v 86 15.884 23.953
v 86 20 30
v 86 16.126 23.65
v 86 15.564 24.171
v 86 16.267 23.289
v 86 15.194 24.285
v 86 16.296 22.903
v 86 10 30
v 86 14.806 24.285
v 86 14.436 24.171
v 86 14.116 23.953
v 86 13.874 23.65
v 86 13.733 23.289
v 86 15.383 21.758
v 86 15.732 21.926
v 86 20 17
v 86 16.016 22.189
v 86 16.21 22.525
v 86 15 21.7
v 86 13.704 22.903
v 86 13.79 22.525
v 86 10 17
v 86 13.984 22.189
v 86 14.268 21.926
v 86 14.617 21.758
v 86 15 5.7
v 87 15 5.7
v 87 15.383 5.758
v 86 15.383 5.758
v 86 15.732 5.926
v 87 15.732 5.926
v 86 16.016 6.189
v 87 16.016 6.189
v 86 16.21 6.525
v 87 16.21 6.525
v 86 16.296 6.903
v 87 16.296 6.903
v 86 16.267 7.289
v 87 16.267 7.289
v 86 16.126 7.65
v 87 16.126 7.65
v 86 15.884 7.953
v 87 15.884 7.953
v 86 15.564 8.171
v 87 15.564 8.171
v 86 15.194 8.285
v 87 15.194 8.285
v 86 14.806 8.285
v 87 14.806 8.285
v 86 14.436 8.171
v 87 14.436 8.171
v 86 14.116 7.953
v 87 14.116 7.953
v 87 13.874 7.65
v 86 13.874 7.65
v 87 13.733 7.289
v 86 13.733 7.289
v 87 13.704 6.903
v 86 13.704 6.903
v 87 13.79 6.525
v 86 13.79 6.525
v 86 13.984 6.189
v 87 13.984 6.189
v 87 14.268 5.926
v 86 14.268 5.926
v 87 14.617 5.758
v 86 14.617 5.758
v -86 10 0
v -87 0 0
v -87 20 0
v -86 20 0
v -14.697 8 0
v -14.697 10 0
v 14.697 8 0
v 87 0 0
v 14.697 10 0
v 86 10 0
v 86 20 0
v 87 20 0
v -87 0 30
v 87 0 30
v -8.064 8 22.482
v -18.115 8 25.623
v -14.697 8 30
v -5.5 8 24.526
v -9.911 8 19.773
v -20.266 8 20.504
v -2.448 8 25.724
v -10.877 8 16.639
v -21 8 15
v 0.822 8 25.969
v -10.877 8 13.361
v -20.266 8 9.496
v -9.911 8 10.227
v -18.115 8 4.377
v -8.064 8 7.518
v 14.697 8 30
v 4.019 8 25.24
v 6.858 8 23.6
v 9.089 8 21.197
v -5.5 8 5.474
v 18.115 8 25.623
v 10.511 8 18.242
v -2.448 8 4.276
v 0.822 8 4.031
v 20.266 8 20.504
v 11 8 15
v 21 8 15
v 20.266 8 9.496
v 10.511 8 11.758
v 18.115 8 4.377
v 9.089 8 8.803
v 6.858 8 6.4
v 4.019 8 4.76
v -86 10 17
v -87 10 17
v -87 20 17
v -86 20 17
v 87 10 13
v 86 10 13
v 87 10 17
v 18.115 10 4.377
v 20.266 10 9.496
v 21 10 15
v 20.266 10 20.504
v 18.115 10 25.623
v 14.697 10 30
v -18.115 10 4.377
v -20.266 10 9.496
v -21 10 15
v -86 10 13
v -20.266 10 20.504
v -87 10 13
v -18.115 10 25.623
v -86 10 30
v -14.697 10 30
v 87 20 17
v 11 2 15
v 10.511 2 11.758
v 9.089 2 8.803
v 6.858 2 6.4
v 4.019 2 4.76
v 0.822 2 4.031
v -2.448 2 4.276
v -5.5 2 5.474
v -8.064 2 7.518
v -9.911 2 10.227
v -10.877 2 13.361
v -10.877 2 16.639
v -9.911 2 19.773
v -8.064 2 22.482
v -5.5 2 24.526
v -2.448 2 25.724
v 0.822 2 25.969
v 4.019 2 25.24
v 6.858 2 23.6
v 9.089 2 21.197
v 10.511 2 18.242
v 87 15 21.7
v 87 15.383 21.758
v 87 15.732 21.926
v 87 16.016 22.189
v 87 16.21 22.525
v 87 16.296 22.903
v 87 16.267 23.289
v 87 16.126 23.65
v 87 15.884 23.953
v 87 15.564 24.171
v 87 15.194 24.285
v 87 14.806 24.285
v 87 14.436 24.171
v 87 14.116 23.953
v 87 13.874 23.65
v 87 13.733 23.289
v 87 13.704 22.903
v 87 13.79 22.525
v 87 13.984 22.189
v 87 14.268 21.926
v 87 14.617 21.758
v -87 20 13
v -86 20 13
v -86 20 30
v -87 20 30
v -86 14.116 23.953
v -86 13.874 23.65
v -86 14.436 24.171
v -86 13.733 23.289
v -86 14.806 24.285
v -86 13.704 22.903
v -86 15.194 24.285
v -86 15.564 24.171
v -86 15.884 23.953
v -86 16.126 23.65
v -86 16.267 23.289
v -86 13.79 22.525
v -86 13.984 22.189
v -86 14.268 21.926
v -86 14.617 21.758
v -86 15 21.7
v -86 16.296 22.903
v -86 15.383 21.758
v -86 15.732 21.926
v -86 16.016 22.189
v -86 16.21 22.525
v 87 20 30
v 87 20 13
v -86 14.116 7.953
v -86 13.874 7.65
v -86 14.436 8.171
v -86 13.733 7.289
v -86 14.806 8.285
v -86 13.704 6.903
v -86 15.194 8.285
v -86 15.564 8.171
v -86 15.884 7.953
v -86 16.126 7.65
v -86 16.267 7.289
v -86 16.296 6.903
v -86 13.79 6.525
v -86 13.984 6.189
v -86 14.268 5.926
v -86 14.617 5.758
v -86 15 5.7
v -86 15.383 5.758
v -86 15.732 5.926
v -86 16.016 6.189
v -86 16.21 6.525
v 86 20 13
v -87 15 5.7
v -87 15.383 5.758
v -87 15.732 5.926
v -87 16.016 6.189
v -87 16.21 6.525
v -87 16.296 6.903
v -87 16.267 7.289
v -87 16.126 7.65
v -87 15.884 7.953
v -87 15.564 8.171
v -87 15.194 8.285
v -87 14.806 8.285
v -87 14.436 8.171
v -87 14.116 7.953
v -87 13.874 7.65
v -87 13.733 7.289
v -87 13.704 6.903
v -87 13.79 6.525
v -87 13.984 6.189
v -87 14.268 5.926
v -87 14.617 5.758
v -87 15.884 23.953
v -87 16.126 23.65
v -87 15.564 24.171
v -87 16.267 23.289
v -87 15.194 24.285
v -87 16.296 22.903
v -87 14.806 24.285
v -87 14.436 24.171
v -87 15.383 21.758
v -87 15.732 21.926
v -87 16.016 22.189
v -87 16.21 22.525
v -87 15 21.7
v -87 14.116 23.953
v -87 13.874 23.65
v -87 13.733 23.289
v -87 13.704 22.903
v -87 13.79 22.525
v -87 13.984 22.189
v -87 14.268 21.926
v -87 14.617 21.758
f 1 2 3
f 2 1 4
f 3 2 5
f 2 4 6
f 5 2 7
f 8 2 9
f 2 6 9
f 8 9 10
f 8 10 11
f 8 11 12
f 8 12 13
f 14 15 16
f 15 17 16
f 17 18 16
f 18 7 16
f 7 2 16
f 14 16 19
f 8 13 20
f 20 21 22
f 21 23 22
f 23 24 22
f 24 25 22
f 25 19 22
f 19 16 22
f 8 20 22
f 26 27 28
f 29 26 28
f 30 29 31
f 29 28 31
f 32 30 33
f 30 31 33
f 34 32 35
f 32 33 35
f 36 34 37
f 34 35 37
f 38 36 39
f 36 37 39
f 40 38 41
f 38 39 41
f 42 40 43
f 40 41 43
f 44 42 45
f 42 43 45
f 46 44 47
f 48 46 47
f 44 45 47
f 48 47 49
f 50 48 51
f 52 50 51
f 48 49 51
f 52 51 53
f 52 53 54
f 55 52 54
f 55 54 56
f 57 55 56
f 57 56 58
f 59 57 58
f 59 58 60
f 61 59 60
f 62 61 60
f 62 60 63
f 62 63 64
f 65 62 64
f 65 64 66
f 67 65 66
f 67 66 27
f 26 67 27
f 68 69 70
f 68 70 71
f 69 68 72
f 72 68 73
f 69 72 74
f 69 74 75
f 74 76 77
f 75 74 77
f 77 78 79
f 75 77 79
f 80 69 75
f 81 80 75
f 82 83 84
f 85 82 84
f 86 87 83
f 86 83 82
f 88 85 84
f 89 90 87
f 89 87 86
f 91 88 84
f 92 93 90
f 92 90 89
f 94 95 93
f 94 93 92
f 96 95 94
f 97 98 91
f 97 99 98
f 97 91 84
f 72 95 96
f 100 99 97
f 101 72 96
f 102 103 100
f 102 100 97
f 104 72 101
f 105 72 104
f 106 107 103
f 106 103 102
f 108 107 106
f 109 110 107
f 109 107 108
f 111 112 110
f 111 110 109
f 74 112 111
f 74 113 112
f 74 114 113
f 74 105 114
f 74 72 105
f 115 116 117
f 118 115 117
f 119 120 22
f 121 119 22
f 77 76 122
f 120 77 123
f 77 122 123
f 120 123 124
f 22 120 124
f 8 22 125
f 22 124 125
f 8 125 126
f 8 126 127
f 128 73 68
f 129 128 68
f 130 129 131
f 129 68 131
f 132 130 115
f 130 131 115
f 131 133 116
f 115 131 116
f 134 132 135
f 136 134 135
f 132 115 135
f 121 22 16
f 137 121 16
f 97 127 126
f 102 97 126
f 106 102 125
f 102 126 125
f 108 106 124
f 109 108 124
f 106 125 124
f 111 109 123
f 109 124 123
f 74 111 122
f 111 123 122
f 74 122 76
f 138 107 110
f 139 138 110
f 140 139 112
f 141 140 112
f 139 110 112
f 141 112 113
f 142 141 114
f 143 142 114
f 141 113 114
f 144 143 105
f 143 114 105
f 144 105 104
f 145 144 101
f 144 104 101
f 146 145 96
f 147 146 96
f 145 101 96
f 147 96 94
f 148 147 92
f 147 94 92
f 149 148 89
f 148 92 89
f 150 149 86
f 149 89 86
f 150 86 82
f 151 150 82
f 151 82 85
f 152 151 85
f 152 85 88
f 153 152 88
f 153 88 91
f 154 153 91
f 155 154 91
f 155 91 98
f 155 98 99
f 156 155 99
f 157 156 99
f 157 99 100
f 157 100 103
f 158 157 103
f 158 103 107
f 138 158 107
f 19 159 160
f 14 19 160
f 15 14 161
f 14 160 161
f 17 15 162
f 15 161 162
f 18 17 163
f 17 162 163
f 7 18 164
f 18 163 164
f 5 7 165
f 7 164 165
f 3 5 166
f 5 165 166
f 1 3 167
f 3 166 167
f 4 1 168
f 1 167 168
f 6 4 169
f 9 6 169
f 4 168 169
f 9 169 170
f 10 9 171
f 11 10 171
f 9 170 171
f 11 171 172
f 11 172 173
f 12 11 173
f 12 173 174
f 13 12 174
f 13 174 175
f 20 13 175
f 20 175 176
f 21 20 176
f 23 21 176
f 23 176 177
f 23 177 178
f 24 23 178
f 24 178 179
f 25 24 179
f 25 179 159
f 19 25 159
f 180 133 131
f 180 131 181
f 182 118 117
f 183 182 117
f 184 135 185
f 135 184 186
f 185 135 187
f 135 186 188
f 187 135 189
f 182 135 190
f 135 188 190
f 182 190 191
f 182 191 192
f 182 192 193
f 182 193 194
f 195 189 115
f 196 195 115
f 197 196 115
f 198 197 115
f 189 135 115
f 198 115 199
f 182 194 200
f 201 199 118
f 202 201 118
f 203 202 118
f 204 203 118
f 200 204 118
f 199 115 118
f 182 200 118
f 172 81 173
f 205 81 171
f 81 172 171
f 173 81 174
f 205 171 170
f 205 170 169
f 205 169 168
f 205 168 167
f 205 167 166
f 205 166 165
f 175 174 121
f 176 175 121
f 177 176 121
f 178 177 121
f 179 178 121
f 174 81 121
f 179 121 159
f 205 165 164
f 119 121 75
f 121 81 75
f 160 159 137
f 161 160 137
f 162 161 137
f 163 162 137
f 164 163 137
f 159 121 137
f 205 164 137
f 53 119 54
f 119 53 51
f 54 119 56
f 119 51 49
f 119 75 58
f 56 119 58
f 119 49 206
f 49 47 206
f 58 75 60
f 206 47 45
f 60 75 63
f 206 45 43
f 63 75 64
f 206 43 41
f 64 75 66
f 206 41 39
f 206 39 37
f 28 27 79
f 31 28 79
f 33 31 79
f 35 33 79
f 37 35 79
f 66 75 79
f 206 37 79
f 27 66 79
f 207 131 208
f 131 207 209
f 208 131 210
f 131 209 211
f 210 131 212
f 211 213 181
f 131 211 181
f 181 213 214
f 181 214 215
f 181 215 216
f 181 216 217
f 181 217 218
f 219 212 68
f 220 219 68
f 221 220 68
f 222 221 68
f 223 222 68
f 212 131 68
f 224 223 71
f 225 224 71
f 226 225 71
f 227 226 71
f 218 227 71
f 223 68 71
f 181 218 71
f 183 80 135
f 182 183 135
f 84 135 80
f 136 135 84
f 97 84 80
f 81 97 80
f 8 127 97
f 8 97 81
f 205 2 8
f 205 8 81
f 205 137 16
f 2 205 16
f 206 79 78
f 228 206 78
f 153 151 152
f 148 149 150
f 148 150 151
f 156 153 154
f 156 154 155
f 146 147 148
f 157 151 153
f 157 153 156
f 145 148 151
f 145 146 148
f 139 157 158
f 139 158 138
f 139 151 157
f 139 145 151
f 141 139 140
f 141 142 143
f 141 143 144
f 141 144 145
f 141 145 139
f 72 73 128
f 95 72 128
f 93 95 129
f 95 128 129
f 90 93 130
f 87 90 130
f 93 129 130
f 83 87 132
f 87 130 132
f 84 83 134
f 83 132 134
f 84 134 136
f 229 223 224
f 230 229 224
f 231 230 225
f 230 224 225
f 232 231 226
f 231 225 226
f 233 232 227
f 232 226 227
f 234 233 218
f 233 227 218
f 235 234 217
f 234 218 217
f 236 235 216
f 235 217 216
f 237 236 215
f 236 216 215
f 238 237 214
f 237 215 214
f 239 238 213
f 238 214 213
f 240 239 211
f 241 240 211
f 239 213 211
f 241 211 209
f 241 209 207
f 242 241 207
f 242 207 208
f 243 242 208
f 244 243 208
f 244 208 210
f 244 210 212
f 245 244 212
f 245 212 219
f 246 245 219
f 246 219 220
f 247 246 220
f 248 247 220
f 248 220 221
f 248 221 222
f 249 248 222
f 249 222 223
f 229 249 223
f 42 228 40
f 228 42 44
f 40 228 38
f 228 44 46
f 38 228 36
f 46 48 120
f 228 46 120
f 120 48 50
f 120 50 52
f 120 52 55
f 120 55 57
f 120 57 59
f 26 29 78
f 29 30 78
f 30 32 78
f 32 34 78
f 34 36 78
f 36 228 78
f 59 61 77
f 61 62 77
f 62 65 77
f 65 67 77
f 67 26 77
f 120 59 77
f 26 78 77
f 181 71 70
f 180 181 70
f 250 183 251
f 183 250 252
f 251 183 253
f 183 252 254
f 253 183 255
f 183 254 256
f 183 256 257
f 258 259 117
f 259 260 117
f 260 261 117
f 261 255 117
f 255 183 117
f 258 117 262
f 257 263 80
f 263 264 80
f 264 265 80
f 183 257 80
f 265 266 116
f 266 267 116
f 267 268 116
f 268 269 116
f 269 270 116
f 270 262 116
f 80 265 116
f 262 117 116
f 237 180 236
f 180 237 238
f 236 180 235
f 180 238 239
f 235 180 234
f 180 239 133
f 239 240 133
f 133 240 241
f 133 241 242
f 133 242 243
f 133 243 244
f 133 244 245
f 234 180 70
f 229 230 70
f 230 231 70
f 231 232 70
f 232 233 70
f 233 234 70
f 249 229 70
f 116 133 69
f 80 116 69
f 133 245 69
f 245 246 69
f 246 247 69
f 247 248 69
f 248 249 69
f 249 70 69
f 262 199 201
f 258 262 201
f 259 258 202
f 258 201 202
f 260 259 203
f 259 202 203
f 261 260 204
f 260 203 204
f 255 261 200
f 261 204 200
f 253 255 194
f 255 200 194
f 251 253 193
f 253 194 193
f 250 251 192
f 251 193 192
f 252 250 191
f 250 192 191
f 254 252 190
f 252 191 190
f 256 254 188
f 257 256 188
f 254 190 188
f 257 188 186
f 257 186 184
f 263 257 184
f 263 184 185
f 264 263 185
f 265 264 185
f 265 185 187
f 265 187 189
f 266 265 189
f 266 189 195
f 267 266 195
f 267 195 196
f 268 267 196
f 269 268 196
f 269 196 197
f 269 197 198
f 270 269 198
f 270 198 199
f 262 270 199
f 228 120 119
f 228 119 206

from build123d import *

# Parameters (mm, degrees)
BOSS_EXTRUDE1_DEPTH     = 30
SKETCH2_R               = 11
CUT_EXTRUDE1_DEPTH      = 8
SKETCH3_R               = 1.3
CUT_EXTRUDE2_DEPTH      = 1
CUT_EXTRUDE2_DEPTH_BACK = 175
SKETCH4_W               = 4
SKETCH4_H               = 10
CUT_EXTRUDE3_DEPTH      = 1
CUT_EXTRUDE3_DEPTH_BACK = 175
SKETCH5_R               = 21
CUT_EXTRUDE4_DEPTH      = 2


with BuildPart() as part:
    # Sketch1 → Boss-Extrude1 (new body)
    with BuildSketch(Plane.XY):
        Polygon((-87, 20), (-87, 0), (87, 0), (87, 20), (86, 20), (86, 10), (-86, 10), (-86, 20), align=None)
    extrude(amount=BOSS_EXTRUDE1_DEPTH)

    # Sketch2 → Cut-Extrude1 (cut)
    with BuildSketch(Plane(origin=(0, 10, 0), x_dir=(1, 0, 0), z_dir=(0, 1, 0))):
        with Locations((0, -15)):
            Circle(SKETCH2_R)
    extrude(amount=-CUT_EXTRUDE1_DEPTH, mode=Mode.SUBTRACT)

    # Sketch3 → Cut-Extrude2 (cut, two sides)
    with BuildSketch(Plane(origin=(87, 0, 0), x_dir=(0, 0, -1), z_dir=(1, 0, 0))) as cut_extrude2_sk:
        with Locations((-23, 15)):
            Circle(SKETCH3_R)
        with Locations((-7, 15)):
            Circle(SKETCH3_R)
    extrude(amount=CUT_EXTRUDE2_DEPTH, mode=Mode.SUBTRACT)
    extrude(cut_extrude2_sk.sketch, amount=-CUT_EXTRUDE2_DEPTH_BACK, mode=Mode.SUBTRACT)

    # Sketch4 → Cut-Extrude3 (cut, two sides)
    with BuildSketch(Plane.ZY.offset(87)) as cut_extrude3_sk:
        with Locations((15, 15)):
            Rectangle(SKETCH4_W, SKETCH4_H)
    extrude(amount=CUT_EXTRUDE3_DEPTH, mode=Mode.SUBTRACT)
    extrude(cut_extrude3_sk.sketch, amount=-CUT_EXTRUDE3_DEPTH_BACK, mode=Mode.SUBTRACT)

    # Sketch5 → Cut-Extrude4 (cut)
    with BuildSketch(Plane(origin=(0, 10, 0), x_dir=(1, 0, 0), z_dir=(0, 1, 0))):
        with Locations((0, -15)):
            Circle(SKETCH5_R)
    extrude(amount=-CUT_EXTRUDE4_DEPTH, mode=Mode.SUBTRACT)


solid = part.part
